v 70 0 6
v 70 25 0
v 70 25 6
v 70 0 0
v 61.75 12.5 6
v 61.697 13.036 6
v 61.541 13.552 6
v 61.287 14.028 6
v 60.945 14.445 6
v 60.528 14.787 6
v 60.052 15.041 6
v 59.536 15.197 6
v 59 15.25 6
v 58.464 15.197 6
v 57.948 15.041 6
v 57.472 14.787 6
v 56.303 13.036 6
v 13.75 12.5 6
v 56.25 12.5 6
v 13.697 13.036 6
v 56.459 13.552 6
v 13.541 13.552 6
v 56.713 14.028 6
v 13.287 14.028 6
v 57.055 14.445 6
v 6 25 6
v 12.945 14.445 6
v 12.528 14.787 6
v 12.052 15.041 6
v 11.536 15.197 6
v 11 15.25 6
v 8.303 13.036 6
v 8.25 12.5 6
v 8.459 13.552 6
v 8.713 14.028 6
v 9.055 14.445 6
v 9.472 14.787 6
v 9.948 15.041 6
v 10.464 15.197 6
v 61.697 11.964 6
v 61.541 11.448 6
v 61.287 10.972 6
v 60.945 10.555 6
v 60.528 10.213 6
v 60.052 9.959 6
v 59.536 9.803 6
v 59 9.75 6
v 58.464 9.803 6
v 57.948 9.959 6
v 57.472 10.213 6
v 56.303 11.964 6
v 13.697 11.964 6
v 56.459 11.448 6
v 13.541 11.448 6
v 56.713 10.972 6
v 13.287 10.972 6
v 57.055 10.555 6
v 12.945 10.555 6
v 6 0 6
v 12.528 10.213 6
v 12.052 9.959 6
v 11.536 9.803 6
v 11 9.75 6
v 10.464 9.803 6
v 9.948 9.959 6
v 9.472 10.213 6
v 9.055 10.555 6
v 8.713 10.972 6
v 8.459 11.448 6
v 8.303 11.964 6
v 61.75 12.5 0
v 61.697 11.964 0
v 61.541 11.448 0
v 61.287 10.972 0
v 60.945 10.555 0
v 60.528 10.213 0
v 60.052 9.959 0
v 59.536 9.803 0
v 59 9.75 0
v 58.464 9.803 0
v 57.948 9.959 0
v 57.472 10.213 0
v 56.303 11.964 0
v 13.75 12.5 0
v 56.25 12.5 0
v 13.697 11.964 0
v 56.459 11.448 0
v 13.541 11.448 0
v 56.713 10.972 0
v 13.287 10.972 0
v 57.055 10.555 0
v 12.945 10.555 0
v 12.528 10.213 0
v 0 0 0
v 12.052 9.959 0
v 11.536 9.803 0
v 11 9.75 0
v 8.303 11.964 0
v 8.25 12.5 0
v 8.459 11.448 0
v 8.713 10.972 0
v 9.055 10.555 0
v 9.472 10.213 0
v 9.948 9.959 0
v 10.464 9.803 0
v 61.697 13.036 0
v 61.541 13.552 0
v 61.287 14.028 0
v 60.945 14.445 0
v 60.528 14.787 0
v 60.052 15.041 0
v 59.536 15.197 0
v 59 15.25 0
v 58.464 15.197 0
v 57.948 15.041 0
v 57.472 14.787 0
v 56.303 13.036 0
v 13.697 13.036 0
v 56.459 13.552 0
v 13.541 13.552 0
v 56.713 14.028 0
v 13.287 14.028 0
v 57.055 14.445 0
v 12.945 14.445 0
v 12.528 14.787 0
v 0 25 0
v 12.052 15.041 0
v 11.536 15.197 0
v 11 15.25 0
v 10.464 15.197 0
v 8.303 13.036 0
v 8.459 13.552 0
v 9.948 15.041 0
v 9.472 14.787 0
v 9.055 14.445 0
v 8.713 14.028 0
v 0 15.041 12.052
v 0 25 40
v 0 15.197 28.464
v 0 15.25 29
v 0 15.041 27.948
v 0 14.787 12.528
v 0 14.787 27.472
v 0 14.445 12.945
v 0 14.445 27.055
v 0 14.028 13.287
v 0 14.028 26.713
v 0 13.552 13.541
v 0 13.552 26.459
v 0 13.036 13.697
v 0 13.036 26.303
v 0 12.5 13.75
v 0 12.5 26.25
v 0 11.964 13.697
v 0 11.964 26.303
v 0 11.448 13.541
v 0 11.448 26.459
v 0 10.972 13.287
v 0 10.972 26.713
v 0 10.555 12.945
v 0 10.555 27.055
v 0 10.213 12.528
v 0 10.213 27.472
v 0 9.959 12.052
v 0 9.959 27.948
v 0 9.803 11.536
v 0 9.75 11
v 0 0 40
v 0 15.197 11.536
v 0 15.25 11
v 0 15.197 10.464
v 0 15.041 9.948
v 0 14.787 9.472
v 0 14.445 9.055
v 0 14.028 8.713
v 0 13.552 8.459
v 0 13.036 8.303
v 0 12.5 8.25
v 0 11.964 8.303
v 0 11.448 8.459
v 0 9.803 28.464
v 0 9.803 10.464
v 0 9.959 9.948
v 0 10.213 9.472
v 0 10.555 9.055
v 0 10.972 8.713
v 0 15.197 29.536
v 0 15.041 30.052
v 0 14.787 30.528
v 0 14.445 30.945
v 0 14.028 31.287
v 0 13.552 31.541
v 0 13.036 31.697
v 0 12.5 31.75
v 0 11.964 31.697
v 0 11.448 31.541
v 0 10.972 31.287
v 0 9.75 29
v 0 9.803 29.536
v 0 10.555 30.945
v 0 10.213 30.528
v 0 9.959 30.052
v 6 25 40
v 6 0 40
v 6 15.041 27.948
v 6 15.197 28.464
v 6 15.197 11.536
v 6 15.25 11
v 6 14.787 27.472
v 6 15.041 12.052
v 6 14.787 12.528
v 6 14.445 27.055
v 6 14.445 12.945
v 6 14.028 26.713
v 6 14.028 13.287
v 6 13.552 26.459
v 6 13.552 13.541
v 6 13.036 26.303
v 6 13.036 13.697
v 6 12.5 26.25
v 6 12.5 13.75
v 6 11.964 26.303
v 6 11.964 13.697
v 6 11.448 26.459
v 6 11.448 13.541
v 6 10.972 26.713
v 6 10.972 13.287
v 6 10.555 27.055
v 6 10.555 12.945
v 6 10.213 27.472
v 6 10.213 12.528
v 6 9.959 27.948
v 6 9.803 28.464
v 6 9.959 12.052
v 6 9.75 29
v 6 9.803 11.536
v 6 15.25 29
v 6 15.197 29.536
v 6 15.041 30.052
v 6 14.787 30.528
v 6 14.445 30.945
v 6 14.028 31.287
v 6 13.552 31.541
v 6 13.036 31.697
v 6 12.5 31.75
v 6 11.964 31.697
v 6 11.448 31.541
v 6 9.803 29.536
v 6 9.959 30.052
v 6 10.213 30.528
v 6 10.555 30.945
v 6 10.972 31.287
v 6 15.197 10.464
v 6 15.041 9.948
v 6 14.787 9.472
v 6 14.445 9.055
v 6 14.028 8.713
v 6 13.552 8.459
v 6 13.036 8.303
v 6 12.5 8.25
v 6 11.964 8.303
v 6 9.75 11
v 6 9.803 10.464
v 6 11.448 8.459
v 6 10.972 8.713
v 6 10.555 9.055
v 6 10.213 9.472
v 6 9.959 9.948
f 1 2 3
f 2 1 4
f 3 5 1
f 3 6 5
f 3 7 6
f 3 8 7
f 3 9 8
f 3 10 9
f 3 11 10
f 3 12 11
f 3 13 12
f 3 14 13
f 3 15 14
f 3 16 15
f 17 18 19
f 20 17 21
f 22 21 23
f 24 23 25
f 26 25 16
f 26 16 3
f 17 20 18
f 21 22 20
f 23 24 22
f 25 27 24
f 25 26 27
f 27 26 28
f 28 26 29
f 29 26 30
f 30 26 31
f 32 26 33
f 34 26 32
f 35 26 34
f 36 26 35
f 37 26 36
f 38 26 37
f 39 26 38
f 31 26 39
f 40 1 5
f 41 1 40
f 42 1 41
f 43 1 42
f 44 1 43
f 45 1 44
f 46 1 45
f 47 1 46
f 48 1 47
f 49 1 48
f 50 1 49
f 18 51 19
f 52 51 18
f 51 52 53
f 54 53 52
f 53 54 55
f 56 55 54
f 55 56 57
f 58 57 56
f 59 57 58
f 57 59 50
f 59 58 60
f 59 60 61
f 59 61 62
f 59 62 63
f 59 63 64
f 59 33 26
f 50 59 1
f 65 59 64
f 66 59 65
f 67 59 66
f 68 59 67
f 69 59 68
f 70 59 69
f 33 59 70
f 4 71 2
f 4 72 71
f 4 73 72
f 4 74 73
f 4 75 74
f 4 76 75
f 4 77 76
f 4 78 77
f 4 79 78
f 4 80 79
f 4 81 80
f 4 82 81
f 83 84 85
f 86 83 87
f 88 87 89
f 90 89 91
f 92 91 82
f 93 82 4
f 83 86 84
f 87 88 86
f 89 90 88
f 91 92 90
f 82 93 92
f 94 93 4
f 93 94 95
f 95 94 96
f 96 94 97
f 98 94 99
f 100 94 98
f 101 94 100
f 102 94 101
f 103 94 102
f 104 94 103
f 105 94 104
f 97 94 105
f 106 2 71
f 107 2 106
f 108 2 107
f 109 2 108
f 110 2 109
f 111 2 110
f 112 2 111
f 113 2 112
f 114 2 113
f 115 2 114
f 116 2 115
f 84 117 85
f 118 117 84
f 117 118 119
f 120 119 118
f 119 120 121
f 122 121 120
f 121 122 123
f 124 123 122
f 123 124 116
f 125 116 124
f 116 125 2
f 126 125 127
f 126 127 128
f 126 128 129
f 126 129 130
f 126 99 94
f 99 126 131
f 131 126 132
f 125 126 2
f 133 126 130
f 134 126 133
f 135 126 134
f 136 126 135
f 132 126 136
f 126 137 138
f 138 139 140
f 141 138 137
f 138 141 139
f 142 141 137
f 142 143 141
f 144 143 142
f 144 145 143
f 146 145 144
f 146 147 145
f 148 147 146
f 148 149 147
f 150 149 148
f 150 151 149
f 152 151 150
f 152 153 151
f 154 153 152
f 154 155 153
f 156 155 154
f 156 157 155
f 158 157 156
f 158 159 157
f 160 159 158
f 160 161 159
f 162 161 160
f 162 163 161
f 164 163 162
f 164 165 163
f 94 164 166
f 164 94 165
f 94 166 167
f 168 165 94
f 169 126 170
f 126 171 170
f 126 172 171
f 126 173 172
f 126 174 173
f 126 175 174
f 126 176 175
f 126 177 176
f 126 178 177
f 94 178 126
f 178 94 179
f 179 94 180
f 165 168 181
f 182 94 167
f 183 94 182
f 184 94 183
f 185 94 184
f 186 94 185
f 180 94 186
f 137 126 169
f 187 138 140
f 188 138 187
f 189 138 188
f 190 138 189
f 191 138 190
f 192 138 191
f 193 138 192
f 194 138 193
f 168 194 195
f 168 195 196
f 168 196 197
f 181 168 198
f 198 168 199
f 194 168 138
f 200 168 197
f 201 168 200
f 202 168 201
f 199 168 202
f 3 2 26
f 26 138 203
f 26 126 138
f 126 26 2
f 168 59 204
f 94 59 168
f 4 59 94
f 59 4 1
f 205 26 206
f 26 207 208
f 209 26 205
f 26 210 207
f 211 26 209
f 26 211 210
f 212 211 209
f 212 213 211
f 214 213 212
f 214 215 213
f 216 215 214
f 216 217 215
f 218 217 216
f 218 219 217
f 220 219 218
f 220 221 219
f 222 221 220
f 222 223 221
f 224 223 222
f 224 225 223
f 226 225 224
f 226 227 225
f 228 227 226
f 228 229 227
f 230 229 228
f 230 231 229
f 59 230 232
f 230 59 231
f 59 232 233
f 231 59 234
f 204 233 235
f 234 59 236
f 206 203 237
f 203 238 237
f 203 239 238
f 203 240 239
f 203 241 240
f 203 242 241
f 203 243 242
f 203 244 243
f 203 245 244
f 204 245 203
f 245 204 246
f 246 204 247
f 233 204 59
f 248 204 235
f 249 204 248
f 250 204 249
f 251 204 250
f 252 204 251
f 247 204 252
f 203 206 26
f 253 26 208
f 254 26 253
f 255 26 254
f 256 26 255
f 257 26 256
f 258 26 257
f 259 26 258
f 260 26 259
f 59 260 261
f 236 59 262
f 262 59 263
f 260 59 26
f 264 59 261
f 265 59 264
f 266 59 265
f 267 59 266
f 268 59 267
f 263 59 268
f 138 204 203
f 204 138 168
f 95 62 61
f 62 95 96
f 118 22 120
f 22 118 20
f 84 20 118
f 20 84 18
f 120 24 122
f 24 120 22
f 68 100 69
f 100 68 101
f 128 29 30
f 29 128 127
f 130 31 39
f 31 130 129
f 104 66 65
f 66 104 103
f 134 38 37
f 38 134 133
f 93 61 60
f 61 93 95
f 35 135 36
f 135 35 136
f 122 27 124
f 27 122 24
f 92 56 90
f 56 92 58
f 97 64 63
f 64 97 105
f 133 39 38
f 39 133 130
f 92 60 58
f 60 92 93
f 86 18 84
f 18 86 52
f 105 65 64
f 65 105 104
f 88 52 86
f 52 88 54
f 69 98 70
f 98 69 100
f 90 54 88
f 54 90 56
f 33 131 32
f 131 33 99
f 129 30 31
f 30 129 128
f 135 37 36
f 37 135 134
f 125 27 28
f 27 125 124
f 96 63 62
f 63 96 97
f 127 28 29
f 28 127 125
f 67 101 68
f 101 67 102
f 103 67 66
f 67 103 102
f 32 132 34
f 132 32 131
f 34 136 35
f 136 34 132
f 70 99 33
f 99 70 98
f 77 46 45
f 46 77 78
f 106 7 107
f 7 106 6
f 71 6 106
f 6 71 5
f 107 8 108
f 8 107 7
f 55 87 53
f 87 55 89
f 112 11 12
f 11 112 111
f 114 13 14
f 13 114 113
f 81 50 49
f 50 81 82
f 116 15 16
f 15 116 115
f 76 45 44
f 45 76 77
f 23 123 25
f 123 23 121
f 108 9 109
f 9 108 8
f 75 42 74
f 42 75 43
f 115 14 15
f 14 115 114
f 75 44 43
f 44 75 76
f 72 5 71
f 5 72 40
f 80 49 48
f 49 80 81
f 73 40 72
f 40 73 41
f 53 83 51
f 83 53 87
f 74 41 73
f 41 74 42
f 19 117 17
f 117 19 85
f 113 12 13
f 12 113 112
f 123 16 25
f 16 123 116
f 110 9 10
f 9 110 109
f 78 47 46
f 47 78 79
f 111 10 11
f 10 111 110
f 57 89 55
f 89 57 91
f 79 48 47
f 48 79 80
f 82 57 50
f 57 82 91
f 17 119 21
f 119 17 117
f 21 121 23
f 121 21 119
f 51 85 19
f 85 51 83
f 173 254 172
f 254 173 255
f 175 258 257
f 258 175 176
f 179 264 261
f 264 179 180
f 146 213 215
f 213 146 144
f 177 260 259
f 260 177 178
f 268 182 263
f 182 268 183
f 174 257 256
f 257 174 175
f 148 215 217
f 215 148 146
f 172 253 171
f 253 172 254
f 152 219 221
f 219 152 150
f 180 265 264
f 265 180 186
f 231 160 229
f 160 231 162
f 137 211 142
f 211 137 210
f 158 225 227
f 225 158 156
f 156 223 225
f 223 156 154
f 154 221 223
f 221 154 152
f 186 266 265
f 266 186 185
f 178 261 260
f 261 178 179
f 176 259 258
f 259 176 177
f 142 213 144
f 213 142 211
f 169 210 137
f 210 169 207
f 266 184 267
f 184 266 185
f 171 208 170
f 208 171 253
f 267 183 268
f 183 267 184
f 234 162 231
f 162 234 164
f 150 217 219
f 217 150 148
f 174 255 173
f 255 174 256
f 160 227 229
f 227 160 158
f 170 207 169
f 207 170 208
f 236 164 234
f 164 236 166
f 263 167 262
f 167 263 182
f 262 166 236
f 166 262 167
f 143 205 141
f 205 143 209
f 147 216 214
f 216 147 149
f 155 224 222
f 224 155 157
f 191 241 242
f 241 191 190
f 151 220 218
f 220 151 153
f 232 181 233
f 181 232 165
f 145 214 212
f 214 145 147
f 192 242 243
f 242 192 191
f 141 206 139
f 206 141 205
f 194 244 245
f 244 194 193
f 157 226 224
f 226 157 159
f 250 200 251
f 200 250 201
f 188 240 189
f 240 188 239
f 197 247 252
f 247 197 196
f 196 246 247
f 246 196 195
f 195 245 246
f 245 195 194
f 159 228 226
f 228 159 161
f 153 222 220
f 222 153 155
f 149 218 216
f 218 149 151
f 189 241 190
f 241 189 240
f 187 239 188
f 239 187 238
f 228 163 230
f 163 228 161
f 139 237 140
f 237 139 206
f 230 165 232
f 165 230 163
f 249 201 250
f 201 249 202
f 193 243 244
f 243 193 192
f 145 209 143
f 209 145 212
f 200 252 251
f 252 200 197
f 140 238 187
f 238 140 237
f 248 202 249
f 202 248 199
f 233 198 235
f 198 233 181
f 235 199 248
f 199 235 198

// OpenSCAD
$fn = 32;

// ----------------------------------------------------------------------
// L-bracket: 70 x 25 x 40 mm
// ----------------------------------------------------------------------

// --- parameters (mm) ---
leg_a = 70;               // horizontal leg, X
leg_b = 40;               // vertical leg, Z
depth = 25;               // bracket depth, Y
thick = 6;                // plate thickness
hole_d = 5.5;             // clearance for M5

module hole_z(px, py) {
  translate([px, py, -0.5]) cylinder(h = thick + 1, d = hole_d);
}
module hole_x(pz, py) {
  translate([-0.5, py, pz]) rotate([0, 90, 0]) cylinder(h = thick + 1, d = hole_d);
}

difference() {
  union() {
    /* horizontal leg */
    cube([leg_a, depth, thick]);
    /* vertical leg, overlapping the corner block */
    cube([thick, depth, leg_b]);
  }
  hole_z(11, 12.5);
  hole_z(59, 12.5);
  hole_x(11, 12.5);
  hole_x(29, 12.5);
}
